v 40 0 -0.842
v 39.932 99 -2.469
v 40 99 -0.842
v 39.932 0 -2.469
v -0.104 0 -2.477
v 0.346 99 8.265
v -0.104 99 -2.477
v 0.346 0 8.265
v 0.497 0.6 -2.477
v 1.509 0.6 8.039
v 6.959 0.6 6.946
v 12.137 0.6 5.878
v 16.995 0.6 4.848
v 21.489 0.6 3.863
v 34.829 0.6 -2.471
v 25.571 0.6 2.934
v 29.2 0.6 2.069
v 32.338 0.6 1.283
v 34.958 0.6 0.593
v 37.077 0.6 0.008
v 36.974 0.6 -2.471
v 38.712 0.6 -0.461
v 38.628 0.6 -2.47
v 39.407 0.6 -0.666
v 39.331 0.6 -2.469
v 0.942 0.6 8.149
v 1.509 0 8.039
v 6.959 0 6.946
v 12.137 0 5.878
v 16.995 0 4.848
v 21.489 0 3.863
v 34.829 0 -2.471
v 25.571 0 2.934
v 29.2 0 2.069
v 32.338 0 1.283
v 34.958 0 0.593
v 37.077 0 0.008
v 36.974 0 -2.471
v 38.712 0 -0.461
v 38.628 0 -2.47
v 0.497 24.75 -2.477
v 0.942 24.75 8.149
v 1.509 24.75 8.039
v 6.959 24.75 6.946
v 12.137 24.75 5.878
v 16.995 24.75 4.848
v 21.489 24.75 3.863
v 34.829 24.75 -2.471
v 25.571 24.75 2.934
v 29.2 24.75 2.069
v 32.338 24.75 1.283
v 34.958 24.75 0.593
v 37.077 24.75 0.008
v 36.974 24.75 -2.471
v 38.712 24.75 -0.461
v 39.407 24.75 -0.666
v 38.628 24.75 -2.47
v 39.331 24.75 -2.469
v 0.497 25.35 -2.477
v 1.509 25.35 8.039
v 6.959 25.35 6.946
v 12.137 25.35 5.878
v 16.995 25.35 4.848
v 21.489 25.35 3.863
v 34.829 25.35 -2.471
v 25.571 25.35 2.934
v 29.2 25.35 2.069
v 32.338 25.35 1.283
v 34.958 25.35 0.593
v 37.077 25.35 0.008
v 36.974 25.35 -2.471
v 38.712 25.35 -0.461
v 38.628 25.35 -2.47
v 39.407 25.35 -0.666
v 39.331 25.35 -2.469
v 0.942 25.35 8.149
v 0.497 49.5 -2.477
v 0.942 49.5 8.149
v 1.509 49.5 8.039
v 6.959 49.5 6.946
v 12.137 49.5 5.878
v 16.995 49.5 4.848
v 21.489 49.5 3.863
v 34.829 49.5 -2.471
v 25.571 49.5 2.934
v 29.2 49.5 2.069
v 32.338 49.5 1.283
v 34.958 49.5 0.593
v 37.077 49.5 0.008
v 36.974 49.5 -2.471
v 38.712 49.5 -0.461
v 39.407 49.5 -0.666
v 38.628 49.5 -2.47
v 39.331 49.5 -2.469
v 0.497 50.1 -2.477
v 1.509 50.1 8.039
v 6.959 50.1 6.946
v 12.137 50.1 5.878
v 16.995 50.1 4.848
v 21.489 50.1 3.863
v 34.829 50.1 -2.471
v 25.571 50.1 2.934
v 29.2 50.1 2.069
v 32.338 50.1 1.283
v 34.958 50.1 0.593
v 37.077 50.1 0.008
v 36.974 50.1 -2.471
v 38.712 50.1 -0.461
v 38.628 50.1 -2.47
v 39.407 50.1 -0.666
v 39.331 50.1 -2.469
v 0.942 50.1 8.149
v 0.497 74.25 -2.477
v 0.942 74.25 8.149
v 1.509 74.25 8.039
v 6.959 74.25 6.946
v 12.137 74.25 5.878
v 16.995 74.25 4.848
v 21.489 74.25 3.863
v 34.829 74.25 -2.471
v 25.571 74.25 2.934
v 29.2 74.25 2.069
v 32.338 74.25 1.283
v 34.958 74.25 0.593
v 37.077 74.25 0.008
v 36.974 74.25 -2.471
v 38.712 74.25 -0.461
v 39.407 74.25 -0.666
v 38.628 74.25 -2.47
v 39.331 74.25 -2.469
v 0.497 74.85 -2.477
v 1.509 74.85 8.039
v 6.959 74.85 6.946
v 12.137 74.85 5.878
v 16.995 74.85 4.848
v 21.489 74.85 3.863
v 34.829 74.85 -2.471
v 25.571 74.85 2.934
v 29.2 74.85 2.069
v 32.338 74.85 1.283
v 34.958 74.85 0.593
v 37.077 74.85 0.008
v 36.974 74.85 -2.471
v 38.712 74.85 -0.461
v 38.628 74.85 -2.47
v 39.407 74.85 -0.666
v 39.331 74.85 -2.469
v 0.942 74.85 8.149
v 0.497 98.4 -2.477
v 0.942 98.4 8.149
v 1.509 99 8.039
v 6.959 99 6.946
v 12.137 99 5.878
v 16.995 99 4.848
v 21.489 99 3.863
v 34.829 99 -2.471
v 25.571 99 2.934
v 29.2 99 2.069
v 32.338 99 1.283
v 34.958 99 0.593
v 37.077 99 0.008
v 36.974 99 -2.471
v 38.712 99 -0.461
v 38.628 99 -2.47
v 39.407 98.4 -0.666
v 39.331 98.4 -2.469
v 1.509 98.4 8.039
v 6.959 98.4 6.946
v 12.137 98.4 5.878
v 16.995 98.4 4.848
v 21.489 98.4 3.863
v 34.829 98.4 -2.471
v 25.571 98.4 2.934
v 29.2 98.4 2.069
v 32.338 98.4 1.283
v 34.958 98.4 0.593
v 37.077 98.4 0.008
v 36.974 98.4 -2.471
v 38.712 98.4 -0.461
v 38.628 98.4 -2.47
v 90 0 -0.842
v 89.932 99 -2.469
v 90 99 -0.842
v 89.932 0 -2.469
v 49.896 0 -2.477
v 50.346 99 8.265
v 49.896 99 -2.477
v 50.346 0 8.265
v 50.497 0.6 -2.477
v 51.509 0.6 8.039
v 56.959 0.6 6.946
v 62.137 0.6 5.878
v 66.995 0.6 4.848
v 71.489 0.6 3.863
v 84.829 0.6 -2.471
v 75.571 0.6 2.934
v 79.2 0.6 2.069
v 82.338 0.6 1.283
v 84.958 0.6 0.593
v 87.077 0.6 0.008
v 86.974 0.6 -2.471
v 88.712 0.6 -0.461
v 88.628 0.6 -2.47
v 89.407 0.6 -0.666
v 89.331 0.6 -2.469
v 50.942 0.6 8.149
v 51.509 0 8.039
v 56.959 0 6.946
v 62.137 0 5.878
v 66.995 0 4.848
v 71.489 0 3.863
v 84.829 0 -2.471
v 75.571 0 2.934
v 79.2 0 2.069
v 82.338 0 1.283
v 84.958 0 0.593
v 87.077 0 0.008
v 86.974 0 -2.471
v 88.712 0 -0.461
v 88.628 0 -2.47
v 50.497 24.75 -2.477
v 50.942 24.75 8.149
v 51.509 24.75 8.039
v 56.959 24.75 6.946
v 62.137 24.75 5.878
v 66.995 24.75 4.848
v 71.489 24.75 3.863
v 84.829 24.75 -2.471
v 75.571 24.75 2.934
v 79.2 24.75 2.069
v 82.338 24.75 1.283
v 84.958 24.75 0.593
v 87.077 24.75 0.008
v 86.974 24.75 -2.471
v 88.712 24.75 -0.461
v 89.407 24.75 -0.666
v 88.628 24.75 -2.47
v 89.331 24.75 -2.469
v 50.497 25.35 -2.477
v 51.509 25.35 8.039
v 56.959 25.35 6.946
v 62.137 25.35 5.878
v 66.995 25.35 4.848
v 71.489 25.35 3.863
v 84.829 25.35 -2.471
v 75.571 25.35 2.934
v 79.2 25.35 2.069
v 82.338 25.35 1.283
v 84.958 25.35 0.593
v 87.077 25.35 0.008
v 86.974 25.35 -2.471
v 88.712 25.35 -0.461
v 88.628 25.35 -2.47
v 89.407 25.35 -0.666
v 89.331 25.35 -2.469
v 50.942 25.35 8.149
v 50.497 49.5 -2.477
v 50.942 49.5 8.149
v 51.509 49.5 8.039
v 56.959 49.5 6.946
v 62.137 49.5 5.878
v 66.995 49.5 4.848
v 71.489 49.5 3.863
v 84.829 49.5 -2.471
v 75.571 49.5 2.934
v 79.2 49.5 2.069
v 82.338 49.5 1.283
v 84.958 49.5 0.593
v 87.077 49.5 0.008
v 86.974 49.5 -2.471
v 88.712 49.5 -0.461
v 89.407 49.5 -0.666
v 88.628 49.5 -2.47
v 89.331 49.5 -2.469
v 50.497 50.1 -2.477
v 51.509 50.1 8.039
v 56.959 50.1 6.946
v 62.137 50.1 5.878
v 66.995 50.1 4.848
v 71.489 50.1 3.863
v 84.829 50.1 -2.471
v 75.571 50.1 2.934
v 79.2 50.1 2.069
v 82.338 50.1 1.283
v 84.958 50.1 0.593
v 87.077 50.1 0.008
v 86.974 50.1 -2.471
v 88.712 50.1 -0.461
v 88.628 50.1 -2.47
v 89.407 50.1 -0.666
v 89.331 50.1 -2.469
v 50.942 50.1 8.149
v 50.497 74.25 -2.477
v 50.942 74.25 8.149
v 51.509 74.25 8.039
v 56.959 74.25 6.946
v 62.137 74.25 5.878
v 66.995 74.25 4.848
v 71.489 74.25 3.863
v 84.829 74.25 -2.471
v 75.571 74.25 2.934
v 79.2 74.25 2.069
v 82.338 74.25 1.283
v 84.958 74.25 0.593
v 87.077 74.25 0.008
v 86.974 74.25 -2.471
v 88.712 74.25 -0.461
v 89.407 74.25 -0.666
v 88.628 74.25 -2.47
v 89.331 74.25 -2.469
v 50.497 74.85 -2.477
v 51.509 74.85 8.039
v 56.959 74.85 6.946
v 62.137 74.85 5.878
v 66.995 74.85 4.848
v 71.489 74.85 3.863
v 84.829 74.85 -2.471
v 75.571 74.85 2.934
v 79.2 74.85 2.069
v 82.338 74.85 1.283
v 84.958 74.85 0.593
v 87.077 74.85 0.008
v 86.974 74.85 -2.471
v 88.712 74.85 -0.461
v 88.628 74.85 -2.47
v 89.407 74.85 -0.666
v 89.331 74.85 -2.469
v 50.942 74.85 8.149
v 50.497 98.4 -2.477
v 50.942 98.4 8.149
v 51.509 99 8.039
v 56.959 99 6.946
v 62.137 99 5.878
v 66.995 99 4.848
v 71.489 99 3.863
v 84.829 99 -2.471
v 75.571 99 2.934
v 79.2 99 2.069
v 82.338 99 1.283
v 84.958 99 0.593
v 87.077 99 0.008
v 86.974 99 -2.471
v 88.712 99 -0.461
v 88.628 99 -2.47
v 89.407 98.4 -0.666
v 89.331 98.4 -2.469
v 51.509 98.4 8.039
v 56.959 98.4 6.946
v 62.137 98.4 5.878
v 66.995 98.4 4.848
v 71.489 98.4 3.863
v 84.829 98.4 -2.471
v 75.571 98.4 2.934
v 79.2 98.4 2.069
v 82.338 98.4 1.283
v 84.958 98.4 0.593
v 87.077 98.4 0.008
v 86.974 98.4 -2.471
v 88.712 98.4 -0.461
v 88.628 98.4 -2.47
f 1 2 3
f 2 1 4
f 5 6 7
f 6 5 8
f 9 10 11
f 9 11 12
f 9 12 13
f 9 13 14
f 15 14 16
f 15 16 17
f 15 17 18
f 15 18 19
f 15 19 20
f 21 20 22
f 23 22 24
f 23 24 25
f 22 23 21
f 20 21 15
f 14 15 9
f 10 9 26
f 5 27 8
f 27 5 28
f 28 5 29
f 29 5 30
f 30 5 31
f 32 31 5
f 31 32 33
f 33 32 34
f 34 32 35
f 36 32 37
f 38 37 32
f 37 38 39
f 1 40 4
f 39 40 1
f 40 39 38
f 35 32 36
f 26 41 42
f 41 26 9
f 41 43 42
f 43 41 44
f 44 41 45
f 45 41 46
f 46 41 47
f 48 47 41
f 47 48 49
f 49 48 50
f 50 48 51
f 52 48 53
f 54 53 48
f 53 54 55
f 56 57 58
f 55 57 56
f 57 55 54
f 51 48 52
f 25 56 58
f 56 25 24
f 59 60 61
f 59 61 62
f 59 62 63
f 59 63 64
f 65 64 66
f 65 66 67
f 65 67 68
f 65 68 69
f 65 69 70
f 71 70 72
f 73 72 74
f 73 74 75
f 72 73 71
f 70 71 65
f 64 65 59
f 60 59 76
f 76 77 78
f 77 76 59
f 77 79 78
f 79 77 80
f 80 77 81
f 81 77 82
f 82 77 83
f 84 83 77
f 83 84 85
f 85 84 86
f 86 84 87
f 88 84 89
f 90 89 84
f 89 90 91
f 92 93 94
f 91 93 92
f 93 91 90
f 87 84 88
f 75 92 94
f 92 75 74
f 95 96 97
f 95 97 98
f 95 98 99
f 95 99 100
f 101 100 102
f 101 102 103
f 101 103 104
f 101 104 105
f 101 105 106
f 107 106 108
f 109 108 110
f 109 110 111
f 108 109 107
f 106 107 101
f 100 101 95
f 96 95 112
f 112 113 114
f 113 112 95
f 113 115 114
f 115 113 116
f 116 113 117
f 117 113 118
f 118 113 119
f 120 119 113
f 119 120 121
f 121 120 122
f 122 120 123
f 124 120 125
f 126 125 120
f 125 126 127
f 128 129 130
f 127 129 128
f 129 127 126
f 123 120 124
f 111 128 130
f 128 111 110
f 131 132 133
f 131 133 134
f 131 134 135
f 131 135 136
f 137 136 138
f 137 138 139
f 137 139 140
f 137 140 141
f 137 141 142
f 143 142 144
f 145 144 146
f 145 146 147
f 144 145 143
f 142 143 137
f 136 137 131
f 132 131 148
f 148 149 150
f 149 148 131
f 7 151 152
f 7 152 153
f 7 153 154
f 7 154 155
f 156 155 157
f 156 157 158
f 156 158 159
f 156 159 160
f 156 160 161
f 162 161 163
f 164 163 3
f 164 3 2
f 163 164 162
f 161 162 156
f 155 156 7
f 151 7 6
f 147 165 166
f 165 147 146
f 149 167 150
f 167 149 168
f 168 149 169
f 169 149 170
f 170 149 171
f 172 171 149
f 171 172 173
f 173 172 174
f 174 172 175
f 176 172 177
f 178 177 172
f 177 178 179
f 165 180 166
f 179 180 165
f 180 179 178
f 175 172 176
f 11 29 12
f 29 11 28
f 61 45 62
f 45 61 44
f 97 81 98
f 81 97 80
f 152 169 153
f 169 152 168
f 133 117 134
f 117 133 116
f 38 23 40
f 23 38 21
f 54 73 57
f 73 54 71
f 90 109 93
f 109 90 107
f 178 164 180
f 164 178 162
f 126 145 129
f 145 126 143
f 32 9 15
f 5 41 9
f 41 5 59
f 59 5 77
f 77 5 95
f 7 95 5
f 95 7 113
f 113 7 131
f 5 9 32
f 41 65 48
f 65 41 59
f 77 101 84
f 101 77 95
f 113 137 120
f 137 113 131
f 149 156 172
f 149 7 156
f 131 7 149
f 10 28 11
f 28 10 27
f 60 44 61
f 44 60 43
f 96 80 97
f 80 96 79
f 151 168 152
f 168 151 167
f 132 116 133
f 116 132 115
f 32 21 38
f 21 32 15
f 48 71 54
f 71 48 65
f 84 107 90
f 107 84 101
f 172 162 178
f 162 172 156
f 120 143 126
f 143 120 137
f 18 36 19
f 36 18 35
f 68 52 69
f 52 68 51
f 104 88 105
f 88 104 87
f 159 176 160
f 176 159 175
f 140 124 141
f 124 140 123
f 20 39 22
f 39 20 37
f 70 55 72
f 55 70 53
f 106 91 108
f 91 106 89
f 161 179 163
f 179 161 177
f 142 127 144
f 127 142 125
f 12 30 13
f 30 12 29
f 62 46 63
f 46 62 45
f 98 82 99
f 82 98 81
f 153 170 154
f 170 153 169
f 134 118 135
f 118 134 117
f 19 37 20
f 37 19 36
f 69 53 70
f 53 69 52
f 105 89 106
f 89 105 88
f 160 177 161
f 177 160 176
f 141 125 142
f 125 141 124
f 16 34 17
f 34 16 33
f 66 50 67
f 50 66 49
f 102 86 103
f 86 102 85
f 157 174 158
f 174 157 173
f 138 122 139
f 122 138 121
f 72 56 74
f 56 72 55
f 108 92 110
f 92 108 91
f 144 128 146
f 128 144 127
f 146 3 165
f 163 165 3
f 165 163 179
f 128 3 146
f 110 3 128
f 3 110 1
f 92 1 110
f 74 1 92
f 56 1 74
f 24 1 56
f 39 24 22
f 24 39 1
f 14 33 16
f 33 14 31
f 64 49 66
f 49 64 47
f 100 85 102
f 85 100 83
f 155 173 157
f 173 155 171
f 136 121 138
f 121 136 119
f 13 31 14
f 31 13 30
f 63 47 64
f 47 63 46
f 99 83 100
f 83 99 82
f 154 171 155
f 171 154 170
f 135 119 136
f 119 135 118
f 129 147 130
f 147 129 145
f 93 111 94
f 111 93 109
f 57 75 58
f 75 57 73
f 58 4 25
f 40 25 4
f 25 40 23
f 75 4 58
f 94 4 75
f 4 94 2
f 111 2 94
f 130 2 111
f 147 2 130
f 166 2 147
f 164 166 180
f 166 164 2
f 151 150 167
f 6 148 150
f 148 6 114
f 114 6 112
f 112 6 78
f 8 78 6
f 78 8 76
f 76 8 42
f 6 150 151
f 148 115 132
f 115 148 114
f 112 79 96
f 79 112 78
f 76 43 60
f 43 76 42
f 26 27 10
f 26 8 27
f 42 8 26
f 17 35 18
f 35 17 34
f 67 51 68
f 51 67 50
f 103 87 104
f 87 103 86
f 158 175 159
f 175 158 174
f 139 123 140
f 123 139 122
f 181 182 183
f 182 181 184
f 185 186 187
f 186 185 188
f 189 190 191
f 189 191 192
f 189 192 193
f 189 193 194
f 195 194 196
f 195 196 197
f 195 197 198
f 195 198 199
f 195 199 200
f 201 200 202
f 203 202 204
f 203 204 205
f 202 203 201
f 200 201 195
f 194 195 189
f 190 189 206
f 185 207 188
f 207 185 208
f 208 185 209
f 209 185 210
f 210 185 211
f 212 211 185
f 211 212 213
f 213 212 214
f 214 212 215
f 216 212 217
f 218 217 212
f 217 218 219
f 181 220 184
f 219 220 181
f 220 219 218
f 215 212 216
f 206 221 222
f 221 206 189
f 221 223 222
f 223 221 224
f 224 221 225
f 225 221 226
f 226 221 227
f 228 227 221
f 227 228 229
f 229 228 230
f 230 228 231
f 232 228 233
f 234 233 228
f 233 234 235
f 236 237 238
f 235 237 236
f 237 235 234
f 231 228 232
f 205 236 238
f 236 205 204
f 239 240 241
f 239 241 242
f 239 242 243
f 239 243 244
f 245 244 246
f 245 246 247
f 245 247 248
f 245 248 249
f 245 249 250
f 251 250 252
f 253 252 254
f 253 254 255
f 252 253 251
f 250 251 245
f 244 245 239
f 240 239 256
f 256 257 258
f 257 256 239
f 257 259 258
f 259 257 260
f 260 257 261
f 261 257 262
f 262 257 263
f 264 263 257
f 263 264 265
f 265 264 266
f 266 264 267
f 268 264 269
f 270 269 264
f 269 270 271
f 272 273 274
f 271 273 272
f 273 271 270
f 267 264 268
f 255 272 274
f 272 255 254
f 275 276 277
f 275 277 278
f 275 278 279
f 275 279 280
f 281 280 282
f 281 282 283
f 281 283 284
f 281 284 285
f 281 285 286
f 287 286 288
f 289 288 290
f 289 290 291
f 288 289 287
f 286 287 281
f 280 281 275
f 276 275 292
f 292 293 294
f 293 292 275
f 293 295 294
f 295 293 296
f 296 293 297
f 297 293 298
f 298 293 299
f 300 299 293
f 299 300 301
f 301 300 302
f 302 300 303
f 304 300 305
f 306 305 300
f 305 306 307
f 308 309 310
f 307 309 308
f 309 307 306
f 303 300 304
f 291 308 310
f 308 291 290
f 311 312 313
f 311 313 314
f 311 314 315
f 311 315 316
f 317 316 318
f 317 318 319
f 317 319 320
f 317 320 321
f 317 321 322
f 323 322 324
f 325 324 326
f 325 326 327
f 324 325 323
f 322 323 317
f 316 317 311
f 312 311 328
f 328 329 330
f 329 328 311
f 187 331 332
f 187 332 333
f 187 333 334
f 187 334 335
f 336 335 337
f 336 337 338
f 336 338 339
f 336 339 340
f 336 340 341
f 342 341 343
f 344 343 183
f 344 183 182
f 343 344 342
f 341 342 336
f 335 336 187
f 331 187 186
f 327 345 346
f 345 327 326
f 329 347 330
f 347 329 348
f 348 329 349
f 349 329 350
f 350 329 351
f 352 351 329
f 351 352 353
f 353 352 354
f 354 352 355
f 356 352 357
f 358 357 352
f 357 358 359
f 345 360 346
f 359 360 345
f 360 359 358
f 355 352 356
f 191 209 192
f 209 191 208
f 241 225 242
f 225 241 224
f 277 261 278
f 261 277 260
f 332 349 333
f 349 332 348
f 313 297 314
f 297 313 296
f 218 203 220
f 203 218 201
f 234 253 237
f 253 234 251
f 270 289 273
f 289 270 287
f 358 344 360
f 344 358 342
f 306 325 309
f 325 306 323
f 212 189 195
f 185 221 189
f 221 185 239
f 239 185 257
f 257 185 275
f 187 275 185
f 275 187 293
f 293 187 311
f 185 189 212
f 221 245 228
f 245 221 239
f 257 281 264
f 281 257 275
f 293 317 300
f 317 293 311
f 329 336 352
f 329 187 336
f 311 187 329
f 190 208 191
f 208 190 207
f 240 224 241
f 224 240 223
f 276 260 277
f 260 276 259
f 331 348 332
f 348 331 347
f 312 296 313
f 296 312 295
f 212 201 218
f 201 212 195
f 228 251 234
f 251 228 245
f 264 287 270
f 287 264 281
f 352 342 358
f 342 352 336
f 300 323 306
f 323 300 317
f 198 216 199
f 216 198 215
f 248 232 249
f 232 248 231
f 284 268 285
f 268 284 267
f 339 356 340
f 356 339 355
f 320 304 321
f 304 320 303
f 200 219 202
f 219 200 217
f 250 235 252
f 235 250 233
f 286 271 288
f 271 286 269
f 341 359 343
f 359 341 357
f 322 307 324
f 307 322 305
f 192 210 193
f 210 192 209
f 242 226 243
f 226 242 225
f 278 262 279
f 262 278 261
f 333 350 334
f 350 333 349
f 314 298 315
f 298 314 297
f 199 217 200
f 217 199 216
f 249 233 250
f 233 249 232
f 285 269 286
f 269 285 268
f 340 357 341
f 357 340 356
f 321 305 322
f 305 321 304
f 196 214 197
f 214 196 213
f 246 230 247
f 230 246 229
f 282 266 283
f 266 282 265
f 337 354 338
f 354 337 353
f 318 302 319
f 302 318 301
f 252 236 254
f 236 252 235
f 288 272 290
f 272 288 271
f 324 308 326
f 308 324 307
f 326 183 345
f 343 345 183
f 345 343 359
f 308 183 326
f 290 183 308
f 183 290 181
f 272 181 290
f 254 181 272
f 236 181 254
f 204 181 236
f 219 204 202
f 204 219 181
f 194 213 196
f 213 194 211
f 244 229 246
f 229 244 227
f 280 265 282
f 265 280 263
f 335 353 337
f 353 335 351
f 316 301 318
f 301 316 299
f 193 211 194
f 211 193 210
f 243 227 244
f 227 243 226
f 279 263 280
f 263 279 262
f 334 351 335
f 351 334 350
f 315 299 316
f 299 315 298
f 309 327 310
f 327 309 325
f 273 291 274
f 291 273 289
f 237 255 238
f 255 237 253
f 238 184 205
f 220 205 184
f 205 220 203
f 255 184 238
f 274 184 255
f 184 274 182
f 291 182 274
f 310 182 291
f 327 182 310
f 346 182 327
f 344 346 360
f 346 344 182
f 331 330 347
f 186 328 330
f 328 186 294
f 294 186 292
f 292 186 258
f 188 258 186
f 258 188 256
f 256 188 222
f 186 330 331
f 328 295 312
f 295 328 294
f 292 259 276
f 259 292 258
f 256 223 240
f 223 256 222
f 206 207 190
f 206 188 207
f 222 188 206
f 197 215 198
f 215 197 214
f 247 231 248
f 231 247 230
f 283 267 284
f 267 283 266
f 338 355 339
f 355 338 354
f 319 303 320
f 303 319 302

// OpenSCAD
// file: aerofoil-skewered.scad
// Copyright 2013 Peter Withers
// Licensed as GPL 2

// the follwing array data is converted from PT40.dat retrieved on 14 April 2013 from http://www.ae.illinois.edu/m-selig/ads/coord_database.html
aerofoilData = [[1.000000,0.001356],
[0.997540,0.001963],
[0.990700,0.003687],
[0.980370,0.006189],
[0.966980,0.009283],
[0.950440,0.012906],
[0.930640,0.016996],
[0.907750,0.021447],
[0.882020,0.026182],
[0.853700,0.031153],
[0.823090,0.036316],
[0.790480,0.041628],
[0.756160,0.047029],
[0.720430,0.052435],
[0.683590,0.057749],
[0.645940,0.062857],
[0.607780,0.067611],
[0.569370,0.071880],
[0.530990,0.075601],
[0.492650,0.078789],
[0.454350,0.081431],
[0.416380,0.083445],
[0.378870,0.084740],
[0.342040,0.085252],
[0.306090,0.084987],
[0.271200,0.084026],
[0.237600,0.082474],
[0.205490,0.080395],
[0.175040,0.077784],
[0.146480,0.074578],
[0.119990,0.070658],
[0.095760,0.065886],
[0.073950,0.060130],
[0.054680,0.053385],
[0.038110,0.046061],
[0.024330,0.038699],
[0.013380,0.030716],
[0.005480,0.020620],
[0.000980,0.008495],
[0.000000,-0.000736],
[0.000980,-0.009818],
[0.005480,-0.021336],
[0.013380,-0.030819],
[0.024330,-0.037450],
[0.038110,-0.040671],
[0.054680,-0.041138],
[0.073950,-0.040299],
[0.095760,-0.039114],
[0.119990,-0.037979],
[0.146480,-0.036898],
[0.175040,-0.035785],
[0.205490,-0.034591],
[0.237600,-0.033303],
[0.271200,-0.031924],
[0.306090,-0.030468],
[0.342040,-0.028957],
[0.378870,-0.027409],
[0.416380,-0.025838],
[0.454350,-0.024252],
[0.492650,-0.022652],
[0.530990,-0.021046],
[0.569370,-0.019428],
[0.607780,-0.017799],
[0.645940,-0.016172],
[0.683590,-0.014562],
[0.720430,-0.012988],
[0.756160,-0.011467],
[0.790480,-0.010016],
[0.823090,-0.008651],
[0.853700,-0.007383],
[0.882020,-0.006223],
[0.907750,-0.005176],
[0.930640,-0.004246],
[0.950440,-0.003437],
[0.966980,-0.002751],
[0.980370,-0.002186],
[0.990700,-0.001745],
[0.997540,-0.001453],
[1.000000,-0.001348]];
strutIndexesA = [[5, 70], [70, 10], [10, 65], [65,15], [15, 60], [60,20], [20, 55], [55,25], [25, 50], [50,30], [30,45], [35, 45], [35, 40]];
strutIndexesB = [[73,8],[8, 68], [68, 13], [13, 63], [63,18], [18, 58], [58,23], [23, 53], [53,28], [28, 48], [48,33], [33,43], [33, 43]];
ribHoles = [[0.05,0.005,0.025],[0.15,0.02,0.035],[0.27,0.025,0.04],[0.39,0.025,0.037],[0.51,0.025,0.03],[0.61,0.025,0.025],[0.71,0.020,0.02],[0.81,0.015,0.015]];
module makeFoilPoints(chordLength, padding){
	for (vertex = aerofoilData){
		translate([vertex[0]*chordLength, vertex[1]*chordLength, 0])
		circle(r=padding, center=true);
	}
}
module makeOuter(chordLength, wallThickness){
	difference(){
		hull() makeFoilPoints(chordLength, wallThickness+0.1);
		hull() makeFoilPoints(chordLength, 0.1);
	}
}
module makeSkewers(chordLength, skewerLength, skewerSize, skewerIndexes){
	strutIndexes = strutIndexesB;
			for (index = skewerIndexes){
				translate([aerofoilData[strutIndexes[index][1]][0]*chordLength, aerofoilData[strutIndexes[index][1]][1]*chordLength, skewerLength/2]) cylinder(r=skewerSize, h=skewerLength, center=true);
			}

}
module makeSkewerHoles(chordLength, spanLength, skewerSize, wallThickness, strutIndexes){
		intersection() {
			hull() makeFoilPoints(chordLength, 0.6);
			for (strut = strutIndexes){
				// make the skewer holes
				//translate([aerofoilData[strut[0]][0]*chordLength, aerofoilData[strut[0]][1]*chordLength, 0]) scale([1/10, 1/10, 1/10]) 
				//difference(){
				//	circle(r=(skewerSize+wallThickness)*10, center=true);
				//	circle(r=skewerSize*10, center=true);
				//}
				// do the other pair so that the first and last filet are made even though this doubles up a few
				translate([aerofoilData[strut[1]][0]*chordLength, aerofoilData[strut[1]][1]*chordLength, 0]) scale([1/10, 1/10, 1/10]) 
				difference(){
					circle(r=(skewerSize+wallThickness)*10, center=true);
					circle(r=skewerSize*10, center=true);
				}
			}
		}
}

module makeStruts(chordLength, spanLength, filetSize, wallThickness, strutIndexes){
		intersection() {
			hull() makeFoilPoints(chordLength, 0.6);
			for (strut = strutIndexes){
				// make the struts
				hull(){
					translate([aerofoilData[strut[0]][0]*chordLength, aerofoilData[strut[0]][1]*chordLength, 0]) circle(r=wallThickness/2, center=true);
					translate([aerofoilData[strut[1]][0]*chordLength, aerofoilData[strut[1]][1]*chordLength, 0]) circle(r=wallThickness/2, center=true);
				}
				// make the fillets
				translate([aerofoilData[strut[0]][0]*chordLength, aerofoilData[strut[0]][1]*chordLength, 0]) scale([1/10, 1/10, 1/10]) circle(r=filetSize*10, center=true);
				// do the other pair so that the first and last filet are made even though this doubles up a few
				translate([aerofoilData[strut[1]][0]*chordLength, aerofoilData[strut[1]][1]*chordLength, 0]) scale([1/10, 1/10, 1/10]) circle(r=filetSize*10, center=true);
			}
		}
}

module makeStrutsWithLayers(chordLength, spanLength, filetSize){
	spacing = 2;
	for (ribPos = [0:spacing:spanLength]) translate([0, 0, ribPos])
		if (ribPos/spacing%2 == 1)
			linear_extrude(height = spacing) makeStruts(chordLength, spanLength, filetSize, strutIndexesA);
		else
			linear_extrude(height = spacing) makeStruts(chordLength, spanLength, filetSize, strutIndexesB);
//	intersection(){
//		linear_extrude(height = spanLength) makeStruts(chordLength, spanLength, filetSize, strutIndexesA);
		//for (ribPos = [0:10:spanLength]) translate([-5, -chordLength/2, ribPos]) cube([chordLength+10,chordLength,2]);
//	}
}

module makeAeroFoil(chordLength, spanLength, wallThickness, skewerSize){
	union(){
		linear_extrude(height = spanLength) {
		makeOuter(chordLength, wallThickness);
		makeStruts(chordLength, spanLength, 1, wallThickness, strutIndexesA);
		//makeStruts(chordLength, spanLength, 0, 0.4, strutIndexesB);
		makeSkewerHoles(chordLength, spanLength, skewerSize, wallThickness, strutIndexesB);
		}
		//makeStrutsWithHoles(chordLength, spanLength, 0.6);
		//makeStrutsWithLayers(chordLength, spanLength, 0.4);
	}
}
module makeAerofoilPlate(chordLength, plateThickness, skewerSize){
	difference(){
		translate([0, 4.5,0]) rotate([0,0,-2.4]) 
			linear_extrude(height = plateThickness) 
				hull() makeFoilPoints(chordLength, 0.1);
		translate([0, 4.5,0]) rotate([0,0,-2.4]) for (holePos = ribHoles)translate([holePos[0]*chordLength,holePos[1]*chordLength,plateThickness/2])
			cylinder(h = plateThickness*3, r=skewerSize/2, center = true);
	}
}
rotate([0,0,90])translate([-40,-20,0]) makeSkewers(120, 150, 1.2, [1,4,7,	10]);
// 1.8 has fill between while 1.2 has a single line.
rotate([0,0,90])translate([-40,-20,0]) makeAeroFoil(120, 2.0, 1.2, 2.8);
rotate([0,0,90])translate([-40,   0,0]) makeAeroFoil(120, 2.0, 1.2, 2.8);
rotate([0,0,90])translate([-40, 20,0]) makeAeroFoil(120, 2.0, 1.2, 2.8);
rotate([0,0,90])translate([-40, 40,0]) makeAeroFoil(120, 2.0, 1.2, 2.8);
//rotate([0,0,90])translate([-40, 0,0]) makeAerofoilPlate(120, 0.5, 3.2);
// main file
// Copyright 2013 Peter Withers
// Licensed as GPL 2
use <aerofoil-skewered.scad>;

module aileronCard(chordLength, strutSpacing,strutThickness, strutsPerWing, aileronLength, aileronChord, aileronAngle, overlap){
    aileronThickness = 20;
    spanLength = strutSpacing*strutsPerWing;
    //translate([chordLength-overlap,-spanLength,0]){
    translate([-overlap,-spanLength,0]){
        union(){
            cube([aileronChord+overlap,spanLength-aileronLength,1]);
            //aileronSection(chordLength, aileronChord+overlap, spanLength-aileronLength, aileronThickness,strutsPerWing);
            cube([overlap, spanLength, 1]);
            //aileronSection(chordLength, overlap, spanLength, aileronThickness,strutsPerWing);            
        }
        translate([0,spanLength-aileronLength,0]) %translate([overlap,0,0]) rotate([0,aileronAngle,0]) 
            cube([aileronChord, aileronLength, 1]);
            //aileronSection(chordLength, aileronChord, aileronLength, aileronThickness,strutsPerWing);
    }
}
module aileronSection(chordLength, aileronChord, aileronLength, aileronThickness,strutsPerWing){
    echo(str("aileronSection(",chordLength,",",aileronChord,",",aileronLength,",",aileronThickness,",",strutsPerWing,");"));
    edgeThickness = 0.6;
    strutsPerAileron = strutsPerWing/2;
    intersection(){
        translate([0,0,-aileronThickness/2])union(){
            for (strutCounter = [0:strutsPerAileron-1]){
                translate([0,strutCounter*(aileronLength/strutsPerAileron),0]){
                    cube([aileronChord, edgeThickness, aileronThickness]);
                    cube([edgeThickness, aileronLength/strutsPerAileron, aileronThickness]);
                    translate([aileronChord-edgeThickness,0,0])cube([edgeThickness, aileronLength/strutsPerAileron, aileronThickness]);
                }
            }
            translate([0,aileronLength-edgeThickness,0]) cube([aileronChord,edgeThickness, aileronThickness]);
        }
        translate([aileronChord-chordLength,aileronLength+aileronThickness/2,0])rotate([90,0,0])hull() linear_extrude(height = aileronLength+aileronThickness) makeFoilPoints(chordLength, 0.6);
    }
}
aerofoilRotation = 2.4;
rotate([0,aerofoilRotation,0])
aileronSection(160,40,99,20,8);
translate([50,0,0])rotate([0,aerofoilRotation,0]) aileronSection(160,40,99,20,8);
//aileronCard(120, 40, 8, 120, 20, 10, 10);
